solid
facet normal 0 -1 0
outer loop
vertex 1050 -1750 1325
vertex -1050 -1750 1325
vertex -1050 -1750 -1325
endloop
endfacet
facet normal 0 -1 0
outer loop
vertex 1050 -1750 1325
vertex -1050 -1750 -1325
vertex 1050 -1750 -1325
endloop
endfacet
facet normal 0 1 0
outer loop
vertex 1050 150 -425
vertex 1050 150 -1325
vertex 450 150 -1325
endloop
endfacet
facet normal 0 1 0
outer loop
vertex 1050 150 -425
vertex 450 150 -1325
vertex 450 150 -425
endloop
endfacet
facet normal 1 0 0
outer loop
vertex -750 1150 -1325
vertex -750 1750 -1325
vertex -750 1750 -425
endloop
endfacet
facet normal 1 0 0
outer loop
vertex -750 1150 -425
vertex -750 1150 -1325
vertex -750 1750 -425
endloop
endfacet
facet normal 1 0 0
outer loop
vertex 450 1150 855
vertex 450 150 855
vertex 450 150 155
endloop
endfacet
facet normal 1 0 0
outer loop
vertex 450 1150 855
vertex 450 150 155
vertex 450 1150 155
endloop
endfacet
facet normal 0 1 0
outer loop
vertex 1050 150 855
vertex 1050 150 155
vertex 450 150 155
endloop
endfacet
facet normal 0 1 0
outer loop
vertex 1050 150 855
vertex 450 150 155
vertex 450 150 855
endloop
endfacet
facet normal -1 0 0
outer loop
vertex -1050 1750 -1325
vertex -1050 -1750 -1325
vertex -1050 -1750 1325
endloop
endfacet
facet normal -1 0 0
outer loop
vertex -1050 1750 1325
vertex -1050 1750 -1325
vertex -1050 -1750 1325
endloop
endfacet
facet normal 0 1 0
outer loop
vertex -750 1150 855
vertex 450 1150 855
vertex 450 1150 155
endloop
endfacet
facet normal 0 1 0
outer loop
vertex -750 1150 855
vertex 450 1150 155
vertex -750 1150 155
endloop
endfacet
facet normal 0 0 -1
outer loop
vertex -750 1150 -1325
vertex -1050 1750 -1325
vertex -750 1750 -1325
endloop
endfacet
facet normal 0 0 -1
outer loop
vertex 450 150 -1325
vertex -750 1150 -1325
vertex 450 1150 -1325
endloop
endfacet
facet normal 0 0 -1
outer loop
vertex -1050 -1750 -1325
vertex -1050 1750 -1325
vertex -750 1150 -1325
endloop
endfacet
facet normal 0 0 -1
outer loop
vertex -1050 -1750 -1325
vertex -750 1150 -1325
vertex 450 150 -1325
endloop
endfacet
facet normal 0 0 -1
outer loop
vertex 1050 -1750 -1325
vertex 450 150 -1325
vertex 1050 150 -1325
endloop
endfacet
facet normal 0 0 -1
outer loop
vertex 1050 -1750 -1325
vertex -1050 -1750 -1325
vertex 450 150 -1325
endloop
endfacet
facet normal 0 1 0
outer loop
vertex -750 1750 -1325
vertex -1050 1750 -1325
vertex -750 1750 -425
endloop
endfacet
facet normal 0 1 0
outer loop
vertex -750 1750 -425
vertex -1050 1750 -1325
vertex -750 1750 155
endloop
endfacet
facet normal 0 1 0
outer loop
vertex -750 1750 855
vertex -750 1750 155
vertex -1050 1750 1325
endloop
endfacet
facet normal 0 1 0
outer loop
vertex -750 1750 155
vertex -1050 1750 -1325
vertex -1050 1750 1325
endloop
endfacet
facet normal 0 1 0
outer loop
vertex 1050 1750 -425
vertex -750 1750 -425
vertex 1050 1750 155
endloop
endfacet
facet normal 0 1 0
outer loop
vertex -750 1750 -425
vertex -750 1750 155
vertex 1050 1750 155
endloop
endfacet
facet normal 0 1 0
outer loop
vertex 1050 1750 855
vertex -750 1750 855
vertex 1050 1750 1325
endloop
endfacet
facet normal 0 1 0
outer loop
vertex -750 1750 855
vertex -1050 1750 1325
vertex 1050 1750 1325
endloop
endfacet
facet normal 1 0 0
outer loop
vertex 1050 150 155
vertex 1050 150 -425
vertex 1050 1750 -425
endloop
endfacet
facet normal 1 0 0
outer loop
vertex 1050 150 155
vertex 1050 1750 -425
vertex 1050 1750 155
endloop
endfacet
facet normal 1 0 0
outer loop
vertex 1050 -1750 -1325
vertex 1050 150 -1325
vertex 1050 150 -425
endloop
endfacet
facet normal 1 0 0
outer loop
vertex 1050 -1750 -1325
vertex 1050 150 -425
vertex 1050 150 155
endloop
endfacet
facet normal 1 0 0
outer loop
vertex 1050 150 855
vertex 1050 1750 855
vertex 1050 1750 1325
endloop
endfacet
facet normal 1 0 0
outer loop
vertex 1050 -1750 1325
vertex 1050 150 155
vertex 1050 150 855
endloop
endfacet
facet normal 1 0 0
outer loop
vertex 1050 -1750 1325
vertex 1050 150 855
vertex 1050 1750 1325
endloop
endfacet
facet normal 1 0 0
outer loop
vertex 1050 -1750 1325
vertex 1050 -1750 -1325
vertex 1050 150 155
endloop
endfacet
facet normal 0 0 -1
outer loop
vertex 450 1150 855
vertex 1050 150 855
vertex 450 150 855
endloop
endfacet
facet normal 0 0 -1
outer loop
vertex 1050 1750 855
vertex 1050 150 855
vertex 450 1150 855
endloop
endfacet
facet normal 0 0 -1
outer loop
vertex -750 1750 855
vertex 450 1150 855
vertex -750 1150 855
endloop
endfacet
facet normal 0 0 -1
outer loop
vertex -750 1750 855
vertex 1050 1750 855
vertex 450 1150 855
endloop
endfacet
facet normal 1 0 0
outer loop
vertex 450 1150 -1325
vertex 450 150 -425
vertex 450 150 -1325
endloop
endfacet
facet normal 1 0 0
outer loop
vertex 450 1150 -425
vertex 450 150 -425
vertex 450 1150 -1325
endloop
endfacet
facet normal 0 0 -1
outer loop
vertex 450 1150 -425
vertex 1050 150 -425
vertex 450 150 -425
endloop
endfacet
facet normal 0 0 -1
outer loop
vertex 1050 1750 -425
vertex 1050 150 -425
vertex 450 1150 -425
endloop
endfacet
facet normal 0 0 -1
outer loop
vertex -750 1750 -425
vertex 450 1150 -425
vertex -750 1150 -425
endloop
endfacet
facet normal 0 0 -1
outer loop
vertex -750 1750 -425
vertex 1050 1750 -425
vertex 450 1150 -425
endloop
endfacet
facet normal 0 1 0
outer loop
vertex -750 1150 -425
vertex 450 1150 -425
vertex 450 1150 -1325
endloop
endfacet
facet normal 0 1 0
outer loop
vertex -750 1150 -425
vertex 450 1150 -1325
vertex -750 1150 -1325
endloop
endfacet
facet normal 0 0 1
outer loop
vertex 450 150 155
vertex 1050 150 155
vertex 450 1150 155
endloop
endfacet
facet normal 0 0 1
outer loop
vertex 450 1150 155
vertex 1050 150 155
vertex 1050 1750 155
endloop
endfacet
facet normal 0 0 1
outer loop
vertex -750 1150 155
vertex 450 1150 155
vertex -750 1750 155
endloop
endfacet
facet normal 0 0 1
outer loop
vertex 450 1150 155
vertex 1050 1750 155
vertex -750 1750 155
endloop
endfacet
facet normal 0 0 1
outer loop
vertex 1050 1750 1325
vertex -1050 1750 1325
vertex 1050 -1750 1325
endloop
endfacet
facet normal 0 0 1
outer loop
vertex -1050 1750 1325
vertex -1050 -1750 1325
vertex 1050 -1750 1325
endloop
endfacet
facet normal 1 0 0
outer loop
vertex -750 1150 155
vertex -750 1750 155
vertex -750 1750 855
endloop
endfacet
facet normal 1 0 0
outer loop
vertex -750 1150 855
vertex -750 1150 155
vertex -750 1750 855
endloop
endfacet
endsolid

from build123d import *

# Parameters (mm, degrees)
F0_W     = 2100
F0_H     = 2650
F1_DEPTH = 1750
F5_W     = 1800
F5_H     = 900
F5_H_2   = 700
F6_DEPTH = 600
F7_W     = 1000
F7_H     = 900
F7_H_2   = 700
F8_DEPTH = 600


with BuildPart() as f1:
    # F0 (on Front) → F1 (new body, symmetric)
    with BuildSketch(Plane.XZ):
        Rectangle(F0_W, F0_H)
    extrude(amount=F1_DEPTH, both=True)

    # F5 (on face) → F6 (cut)
    with BuildSketch(Plane(origin=(0, 1750, 0), x_dir=(-1, 0, 0), z_dir=(0, 1, 0))):
        with Locations((-150, -875)):
            Rectangle(F5_W, F5_H)
        with Locations((-150, 505)):
            Rectangle(F5_W, F5_H_2)
    extrude(amount=-F6_DEPTH, mode=Mode.SUBTRACT)

    # F7 (on face) → F8 (cut)
    with BuildSketch(Plane.YZ.offset(1050)):
        with Locations((650, -875)):
            Rectangle(F7_W, F7_H)
        with Locations((650, 505)):
            Rectangle(F7_W, F7_H_2)
    extrude(amount=-F8_DEPTH, mode=Mode.SUBTRACT)


solid = f1.part
